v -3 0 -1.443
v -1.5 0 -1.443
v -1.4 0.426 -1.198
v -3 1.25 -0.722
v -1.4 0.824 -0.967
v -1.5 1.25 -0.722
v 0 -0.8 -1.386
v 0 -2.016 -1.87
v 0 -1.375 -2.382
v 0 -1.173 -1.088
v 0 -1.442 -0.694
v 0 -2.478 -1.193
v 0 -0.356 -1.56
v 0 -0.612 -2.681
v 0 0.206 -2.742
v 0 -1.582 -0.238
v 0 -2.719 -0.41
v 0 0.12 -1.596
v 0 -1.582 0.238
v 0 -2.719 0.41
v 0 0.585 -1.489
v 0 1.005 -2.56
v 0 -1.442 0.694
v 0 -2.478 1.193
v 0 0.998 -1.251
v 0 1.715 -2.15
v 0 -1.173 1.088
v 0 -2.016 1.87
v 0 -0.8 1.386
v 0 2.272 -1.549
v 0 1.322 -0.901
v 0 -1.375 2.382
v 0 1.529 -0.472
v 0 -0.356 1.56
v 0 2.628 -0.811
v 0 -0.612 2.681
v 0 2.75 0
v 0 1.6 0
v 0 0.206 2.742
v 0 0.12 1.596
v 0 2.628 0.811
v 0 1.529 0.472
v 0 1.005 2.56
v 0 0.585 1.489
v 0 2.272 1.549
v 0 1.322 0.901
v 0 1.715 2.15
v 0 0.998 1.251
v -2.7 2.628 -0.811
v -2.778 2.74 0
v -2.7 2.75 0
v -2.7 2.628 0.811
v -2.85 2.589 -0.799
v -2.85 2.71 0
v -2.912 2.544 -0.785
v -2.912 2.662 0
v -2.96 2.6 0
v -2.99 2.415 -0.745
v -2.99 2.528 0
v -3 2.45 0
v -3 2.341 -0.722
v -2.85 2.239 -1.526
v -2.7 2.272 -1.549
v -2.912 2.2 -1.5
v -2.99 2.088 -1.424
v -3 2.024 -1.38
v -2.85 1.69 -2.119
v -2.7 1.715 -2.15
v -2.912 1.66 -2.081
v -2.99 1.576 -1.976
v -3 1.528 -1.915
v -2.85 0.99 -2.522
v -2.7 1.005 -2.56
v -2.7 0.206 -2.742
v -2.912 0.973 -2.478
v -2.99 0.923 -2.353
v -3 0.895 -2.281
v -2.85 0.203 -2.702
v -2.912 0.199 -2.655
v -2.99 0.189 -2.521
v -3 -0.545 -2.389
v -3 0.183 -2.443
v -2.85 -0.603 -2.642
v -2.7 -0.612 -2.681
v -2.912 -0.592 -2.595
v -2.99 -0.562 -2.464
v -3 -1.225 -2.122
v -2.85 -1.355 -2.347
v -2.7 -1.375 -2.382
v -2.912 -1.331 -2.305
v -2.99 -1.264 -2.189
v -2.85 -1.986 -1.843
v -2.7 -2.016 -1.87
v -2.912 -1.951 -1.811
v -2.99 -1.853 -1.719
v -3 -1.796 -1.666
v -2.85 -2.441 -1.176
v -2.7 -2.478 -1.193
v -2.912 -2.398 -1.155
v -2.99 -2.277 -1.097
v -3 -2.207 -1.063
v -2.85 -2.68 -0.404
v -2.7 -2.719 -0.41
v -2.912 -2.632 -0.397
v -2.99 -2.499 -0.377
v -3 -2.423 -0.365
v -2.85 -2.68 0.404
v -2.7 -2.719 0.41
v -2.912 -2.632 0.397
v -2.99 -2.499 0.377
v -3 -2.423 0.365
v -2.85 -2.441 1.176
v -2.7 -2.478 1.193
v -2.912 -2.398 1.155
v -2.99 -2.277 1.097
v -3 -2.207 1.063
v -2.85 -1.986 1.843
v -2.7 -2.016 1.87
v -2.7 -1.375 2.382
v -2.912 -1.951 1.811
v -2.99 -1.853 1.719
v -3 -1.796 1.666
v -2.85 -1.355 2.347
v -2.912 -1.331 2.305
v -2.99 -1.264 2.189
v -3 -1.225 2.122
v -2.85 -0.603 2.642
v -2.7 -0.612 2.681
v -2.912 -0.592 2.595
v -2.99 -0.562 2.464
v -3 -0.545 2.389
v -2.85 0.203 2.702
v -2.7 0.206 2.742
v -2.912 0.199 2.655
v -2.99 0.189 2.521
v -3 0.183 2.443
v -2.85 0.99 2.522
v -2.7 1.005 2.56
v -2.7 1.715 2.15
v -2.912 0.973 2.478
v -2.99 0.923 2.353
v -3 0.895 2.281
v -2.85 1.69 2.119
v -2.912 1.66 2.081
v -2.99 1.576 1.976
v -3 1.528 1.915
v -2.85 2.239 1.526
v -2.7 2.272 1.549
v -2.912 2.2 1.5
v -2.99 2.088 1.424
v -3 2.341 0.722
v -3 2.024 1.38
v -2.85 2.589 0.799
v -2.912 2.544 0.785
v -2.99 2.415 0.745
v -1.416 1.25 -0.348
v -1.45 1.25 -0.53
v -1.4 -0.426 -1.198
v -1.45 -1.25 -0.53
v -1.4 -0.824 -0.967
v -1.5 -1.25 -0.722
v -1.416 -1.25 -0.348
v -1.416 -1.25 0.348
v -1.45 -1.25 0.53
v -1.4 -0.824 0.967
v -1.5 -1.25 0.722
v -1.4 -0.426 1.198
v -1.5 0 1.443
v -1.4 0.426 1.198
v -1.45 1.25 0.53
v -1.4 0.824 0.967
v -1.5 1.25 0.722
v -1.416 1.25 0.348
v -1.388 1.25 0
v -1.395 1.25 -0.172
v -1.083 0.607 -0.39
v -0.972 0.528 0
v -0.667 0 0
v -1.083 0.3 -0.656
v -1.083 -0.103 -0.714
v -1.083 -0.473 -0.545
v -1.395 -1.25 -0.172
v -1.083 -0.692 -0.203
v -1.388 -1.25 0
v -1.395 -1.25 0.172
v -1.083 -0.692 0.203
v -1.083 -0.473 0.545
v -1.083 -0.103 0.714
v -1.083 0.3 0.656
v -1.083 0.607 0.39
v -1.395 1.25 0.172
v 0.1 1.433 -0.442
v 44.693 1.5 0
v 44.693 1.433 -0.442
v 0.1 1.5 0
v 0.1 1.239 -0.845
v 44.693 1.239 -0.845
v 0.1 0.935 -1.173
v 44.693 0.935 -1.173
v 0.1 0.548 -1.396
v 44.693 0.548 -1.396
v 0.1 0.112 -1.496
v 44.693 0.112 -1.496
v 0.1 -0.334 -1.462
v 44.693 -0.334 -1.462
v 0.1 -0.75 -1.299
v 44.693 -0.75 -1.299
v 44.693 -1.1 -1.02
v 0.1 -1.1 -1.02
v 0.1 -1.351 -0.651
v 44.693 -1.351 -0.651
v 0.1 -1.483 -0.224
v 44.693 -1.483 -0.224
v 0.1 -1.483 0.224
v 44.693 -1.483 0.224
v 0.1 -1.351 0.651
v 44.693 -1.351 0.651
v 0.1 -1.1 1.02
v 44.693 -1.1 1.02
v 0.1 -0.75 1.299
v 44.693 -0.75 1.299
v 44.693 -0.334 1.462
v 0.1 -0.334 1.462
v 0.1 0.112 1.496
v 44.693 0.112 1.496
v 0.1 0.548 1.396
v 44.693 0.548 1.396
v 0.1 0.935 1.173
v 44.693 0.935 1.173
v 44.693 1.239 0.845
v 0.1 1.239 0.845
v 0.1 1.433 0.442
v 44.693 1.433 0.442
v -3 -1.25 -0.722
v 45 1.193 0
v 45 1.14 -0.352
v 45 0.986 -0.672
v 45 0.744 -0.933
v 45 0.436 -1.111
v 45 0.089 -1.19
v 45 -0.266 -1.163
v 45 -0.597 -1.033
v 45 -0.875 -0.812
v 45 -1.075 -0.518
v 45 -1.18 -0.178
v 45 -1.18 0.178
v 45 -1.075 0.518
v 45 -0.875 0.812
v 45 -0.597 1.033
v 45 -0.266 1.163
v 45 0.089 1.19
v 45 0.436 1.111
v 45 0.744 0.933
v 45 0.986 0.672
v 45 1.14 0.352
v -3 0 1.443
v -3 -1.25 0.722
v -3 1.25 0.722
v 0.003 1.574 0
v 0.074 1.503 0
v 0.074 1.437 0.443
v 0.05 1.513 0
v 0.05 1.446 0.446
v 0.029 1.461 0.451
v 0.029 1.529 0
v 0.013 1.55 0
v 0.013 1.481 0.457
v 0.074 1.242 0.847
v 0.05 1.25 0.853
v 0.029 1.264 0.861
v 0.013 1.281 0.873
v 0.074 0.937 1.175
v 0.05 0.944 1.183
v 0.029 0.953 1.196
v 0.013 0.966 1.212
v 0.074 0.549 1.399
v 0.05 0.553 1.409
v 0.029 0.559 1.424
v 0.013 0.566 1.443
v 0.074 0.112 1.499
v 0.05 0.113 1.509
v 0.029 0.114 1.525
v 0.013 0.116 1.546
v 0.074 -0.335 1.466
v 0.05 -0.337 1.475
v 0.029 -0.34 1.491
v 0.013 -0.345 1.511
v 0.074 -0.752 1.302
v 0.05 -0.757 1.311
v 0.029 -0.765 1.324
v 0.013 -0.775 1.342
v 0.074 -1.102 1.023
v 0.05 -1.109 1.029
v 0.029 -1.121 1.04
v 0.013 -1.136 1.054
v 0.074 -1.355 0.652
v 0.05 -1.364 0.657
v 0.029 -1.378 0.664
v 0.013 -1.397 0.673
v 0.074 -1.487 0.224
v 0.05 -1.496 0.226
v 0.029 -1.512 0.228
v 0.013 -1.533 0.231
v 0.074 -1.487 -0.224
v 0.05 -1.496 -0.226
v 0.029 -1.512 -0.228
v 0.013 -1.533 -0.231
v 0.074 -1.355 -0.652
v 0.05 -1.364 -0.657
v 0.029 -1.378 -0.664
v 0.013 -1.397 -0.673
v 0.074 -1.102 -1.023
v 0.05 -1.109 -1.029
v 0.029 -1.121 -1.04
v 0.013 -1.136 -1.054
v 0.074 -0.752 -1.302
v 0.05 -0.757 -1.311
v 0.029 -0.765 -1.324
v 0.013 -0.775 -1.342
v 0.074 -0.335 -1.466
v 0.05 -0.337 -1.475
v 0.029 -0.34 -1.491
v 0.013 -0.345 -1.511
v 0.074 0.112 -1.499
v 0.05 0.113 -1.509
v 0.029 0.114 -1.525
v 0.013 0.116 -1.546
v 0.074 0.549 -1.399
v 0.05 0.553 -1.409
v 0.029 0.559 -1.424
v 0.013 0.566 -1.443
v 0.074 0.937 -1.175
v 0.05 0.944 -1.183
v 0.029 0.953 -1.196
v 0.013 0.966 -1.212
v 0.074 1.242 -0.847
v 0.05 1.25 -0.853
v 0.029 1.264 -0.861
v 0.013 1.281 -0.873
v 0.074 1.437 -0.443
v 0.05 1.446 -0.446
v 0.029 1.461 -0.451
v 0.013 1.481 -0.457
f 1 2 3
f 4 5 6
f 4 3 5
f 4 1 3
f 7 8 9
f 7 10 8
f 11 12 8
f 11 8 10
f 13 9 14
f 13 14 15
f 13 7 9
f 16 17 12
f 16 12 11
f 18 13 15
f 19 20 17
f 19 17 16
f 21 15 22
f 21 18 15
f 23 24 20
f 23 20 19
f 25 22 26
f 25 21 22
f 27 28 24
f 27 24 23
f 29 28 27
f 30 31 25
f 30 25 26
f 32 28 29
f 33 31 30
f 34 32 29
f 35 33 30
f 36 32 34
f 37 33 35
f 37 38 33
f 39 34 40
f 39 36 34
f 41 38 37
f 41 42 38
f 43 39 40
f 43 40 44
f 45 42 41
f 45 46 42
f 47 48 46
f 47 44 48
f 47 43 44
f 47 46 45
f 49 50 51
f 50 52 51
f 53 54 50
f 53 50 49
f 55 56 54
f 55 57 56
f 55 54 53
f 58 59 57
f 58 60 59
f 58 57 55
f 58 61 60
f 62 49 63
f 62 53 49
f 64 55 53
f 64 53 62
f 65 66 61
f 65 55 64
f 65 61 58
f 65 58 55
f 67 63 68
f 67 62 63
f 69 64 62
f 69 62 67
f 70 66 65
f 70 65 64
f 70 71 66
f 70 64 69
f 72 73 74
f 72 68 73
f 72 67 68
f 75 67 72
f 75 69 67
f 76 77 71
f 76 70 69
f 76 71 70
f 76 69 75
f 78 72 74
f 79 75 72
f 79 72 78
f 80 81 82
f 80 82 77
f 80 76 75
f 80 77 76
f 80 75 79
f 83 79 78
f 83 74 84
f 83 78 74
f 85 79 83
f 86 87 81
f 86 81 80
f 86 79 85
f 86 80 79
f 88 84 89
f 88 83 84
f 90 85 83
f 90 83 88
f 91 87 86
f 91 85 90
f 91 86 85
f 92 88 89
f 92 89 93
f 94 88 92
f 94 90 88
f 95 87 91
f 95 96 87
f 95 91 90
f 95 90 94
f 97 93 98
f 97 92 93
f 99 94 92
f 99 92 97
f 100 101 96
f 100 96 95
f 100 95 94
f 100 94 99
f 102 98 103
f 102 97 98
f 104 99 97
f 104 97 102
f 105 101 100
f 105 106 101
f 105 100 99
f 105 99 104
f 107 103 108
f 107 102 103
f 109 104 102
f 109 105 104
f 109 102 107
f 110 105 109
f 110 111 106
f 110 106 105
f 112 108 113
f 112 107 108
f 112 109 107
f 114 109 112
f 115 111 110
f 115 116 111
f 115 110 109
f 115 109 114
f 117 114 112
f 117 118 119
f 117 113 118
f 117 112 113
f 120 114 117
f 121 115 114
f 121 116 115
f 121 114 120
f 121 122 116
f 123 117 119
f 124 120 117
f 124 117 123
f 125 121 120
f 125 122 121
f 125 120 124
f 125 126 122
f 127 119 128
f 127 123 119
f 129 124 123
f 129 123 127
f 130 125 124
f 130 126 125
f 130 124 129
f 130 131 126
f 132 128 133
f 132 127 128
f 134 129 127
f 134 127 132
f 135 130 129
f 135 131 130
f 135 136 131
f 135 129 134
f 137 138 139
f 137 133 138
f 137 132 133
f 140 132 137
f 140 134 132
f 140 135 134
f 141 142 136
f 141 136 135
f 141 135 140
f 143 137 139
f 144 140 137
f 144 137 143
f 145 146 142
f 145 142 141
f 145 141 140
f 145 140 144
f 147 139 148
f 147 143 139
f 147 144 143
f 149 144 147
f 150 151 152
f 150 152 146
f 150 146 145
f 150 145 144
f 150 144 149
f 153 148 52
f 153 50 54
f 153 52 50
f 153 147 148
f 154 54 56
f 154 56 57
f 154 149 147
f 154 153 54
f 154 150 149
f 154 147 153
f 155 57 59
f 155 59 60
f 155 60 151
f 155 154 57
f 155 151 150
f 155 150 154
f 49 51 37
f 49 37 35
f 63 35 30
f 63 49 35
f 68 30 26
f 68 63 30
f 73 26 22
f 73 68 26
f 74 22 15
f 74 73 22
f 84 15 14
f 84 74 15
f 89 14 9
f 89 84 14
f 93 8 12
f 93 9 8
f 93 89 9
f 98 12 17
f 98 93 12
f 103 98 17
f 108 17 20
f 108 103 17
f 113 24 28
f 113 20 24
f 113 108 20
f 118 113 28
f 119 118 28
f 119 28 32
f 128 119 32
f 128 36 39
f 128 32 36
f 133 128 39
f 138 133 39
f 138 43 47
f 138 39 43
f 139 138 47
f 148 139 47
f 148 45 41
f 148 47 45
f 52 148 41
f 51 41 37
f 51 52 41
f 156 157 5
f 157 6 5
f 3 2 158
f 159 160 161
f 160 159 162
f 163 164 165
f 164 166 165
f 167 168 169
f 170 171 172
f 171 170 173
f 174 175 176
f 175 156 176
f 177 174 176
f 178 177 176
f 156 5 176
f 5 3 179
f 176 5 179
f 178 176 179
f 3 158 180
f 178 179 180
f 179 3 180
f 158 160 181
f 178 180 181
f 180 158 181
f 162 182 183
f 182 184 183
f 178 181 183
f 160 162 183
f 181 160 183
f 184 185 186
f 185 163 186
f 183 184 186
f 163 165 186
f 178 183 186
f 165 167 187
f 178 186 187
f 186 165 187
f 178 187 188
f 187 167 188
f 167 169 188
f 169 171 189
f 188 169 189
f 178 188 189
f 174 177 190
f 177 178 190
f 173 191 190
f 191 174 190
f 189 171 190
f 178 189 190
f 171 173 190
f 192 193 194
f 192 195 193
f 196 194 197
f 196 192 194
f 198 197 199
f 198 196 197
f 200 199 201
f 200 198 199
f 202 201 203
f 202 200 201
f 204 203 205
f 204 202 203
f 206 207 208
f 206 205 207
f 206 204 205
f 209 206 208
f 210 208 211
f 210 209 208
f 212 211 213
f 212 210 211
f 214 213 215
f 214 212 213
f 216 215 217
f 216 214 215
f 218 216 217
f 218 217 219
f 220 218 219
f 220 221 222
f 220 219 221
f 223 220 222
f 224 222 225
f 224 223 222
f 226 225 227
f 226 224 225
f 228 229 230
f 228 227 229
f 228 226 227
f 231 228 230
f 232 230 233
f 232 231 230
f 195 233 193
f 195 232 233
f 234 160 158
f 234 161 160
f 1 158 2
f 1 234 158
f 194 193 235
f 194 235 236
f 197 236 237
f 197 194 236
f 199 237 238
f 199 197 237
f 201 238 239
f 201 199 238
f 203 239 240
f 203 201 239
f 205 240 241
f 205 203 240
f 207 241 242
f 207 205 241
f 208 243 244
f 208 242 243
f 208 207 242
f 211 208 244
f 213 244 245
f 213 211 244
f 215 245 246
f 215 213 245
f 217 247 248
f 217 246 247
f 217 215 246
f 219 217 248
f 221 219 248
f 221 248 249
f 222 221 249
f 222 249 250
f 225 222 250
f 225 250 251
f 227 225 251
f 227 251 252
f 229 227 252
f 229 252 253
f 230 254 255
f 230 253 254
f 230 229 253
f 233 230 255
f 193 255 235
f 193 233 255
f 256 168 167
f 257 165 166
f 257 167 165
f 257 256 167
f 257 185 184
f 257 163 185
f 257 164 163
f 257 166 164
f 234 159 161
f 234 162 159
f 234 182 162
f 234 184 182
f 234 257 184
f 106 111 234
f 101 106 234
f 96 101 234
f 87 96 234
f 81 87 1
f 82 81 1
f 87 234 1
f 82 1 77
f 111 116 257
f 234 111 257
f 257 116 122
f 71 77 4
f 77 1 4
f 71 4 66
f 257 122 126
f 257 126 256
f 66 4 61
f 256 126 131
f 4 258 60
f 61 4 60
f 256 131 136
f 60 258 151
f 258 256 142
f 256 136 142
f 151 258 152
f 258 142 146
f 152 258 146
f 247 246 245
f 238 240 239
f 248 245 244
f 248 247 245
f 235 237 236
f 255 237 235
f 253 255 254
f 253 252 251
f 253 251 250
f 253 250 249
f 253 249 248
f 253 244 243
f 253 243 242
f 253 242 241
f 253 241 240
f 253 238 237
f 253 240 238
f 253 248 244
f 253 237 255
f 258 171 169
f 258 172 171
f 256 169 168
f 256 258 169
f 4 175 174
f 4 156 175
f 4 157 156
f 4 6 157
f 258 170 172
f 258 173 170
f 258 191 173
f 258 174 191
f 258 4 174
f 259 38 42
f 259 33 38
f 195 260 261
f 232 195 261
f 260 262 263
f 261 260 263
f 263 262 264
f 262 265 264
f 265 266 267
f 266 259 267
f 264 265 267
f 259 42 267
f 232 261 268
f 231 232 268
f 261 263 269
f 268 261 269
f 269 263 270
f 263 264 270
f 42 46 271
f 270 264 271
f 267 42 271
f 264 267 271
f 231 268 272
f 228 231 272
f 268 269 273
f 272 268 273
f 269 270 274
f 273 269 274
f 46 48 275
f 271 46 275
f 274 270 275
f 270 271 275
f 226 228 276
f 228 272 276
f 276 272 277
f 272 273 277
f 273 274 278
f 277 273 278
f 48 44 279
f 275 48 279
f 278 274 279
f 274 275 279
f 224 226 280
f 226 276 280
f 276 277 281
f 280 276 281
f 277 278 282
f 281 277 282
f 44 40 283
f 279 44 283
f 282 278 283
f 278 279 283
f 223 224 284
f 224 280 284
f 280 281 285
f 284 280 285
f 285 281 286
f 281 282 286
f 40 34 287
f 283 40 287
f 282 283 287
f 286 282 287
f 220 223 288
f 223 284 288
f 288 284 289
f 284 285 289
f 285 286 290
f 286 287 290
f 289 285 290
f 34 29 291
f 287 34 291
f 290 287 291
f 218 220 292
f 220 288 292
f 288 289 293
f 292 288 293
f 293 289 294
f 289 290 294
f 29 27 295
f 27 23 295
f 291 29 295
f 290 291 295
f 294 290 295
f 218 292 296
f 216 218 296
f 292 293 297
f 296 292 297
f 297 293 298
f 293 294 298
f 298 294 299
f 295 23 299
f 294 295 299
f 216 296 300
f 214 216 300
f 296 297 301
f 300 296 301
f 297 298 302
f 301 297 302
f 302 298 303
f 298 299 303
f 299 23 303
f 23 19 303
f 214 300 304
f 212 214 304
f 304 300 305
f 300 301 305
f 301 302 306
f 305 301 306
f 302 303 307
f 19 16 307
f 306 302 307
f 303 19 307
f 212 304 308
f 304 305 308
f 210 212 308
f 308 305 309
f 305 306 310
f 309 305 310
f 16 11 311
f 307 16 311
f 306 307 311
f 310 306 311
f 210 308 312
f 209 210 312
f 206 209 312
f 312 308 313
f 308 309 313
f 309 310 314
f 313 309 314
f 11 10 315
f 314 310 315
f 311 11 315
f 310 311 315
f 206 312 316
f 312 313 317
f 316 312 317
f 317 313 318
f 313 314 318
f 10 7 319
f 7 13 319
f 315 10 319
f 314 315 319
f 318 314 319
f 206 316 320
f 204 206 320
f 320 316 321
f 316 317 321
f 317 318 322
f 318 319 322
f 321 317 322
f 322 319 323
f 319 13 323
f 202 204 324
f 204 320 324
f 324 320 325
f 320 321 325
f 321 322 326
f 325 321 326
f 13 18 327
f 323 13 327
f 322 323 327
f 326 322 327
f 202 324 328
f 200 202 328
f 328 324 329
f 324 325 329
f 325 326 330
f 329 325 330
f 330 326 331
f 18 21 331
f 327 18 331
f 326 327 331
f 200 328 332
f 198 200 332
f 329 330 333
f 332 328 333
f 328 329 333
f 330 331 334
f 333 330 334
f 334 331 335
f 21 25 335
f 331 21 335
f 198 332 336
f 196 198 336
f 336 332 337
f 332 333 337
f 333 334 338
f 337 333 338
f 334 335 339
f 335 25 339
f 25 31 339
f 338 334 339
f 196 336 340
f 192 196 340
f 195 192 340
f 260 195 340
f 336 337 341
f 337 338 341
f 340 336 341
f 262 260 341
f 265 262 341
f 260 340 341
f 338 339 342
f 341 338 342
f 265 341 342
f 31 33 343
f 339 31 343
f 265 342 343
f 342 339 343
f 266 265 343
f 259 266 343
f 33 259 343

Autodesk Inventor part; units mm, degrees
ref_plane "YZ Plane" through (0, 0, 0) normal (1, 0, 0) x (0, 1, 0)
ref_plane "XZ Plane" through (0, 0, 0) normal (0, 1, 0) x (-1, 0, 0)
sketch "Sketch1" plane through (0, 0, 0) normal (0, 0, 1) x (1, 0, 0)
  line L0 (-0.6667, 0) -> (45, 0)
  line L1 (45, 0) -> (45, 1.5)
  line L2 (45, 1.5) -> (27, 1.5)
  line L3 (27, 1.5) -> (26.6932, 1.5)
  line L4 (26.6932, 1.5) -> (0, 1.5)
  line L5 (0, 1.5) -> (0, 2.75)
  line L6 (0, 2.75) -> (-3, 2.75)
  line L7 (-3, 2.75) -> (-3, 1.4434)
  line L8 (-3, 1.4434) -> (-1.5, 1.4434)
  line L9 (-1.5, 1.4434) -> (-0.6667, 0)
  line L10 (-10.6, 0) -> (42.6, 0) projected
  line L11 (0, -0.55) -> (0, 3.3) projected
  line L12 (27, 1.5) -> (0, 1.5) construction
  dimension "d1" = 18
  dimension "d2" = 0.3068
  dimension "d3" = 3
  dimension "d4" = 1.5
  dimension "d5" = 60
  dimension "d6" = 3
  dimension "d7" = 3
  dimension "d8" = 2.8868
  dimension "d9" = 5.5
  dimension "d26" = 45
revolve "Body" add sketch "Sketch1" angle 360 about axis through (-0.6667, 0, 0) along (1, 0, 0)
sketch "Sketch2" plane through (-3, 0, 0) normal (-1, 0, 0) x (0, 0, 1)
  circle A0 centre (0, 0) radius 1.4434 projected
  line L0 (0, -3.85) -> (0, 3.85) projected
  line L1 (-3.85, 0) -> (3.85, 0) projected
  line L2 (1.4434, 0) -> (0.7217, -1.25)
  line L3 (0.7217, -1.25) -> (-0.7217, -1.25)
  line L4 (-0.7217, -1.25) -> (-1.4434, 0)
  line L5 (-1.4434, 0) -> (-0.7217, 1.25)
  line L6 (-0.7217, 1.25) -> (0.7217, 1.25)
  line L7 (0.7217, 1.25) -> (1.4434, 0)
  point P0 (0, 0)
extrude "Slot" add sketch "Sketch2" against normal up to next contours L7 A0 | A0 L2 | L6 L0 A0 | A0 L0 L3 | L0 L6 A0 | A0 L3 L0 | L4 A0 | A0 L5
fillet "Fillet1" radius 0.3 1 edges at (-3, -2.75, 0)
thread "Thread" size "M3x0.5" class "6g" standard "ISO Metric profile" length 18
chamfer "Chamfer1" distance 0.3067 distance2 0.3067 1 edges at (45, -1.5, 0) measured on face at (45, -0.8088, -0.4964)
ref_plane "Work Plane1" through (29, 0, 0) normal (0, -1, 0) x (1, 0, 0)
fillet "Fillet2" radius 0.1 1 edges at (0, -1.5, 0)
equation "\"d1\" = GEL"
equation "\"d3\" = KOH"
equation "\"d4\" = INTI"
equation "\"d6\" = GD"
equation "\"d7\" = BDM"
equation "\"d8\" = 1.1547 * SW"
equation "\"d9\" = KOD"
equation "\"d26\" = NLG"
equation "\"d30\" = R"
equation "\"d17\" = RR"
equation "\"d13\" = GEL"
equation "\"d15\" = -0.5 * SPD + 0.5 * GD"
equation "\"d16\" = GUL"
equation "\"GD\" = NND"
equation "\"NLG\" = 45"
equation "\"GEL\" = 18"
equation "\"KOD\" = 5.5"
equation "\"KOH\" = 3"
equation "\"INTI\" = 1.5"
equation "\"GAL\" = 0.61345 * PTC"
equation "\"GUL\" = 0.61345 * PTC"
equation "\"BDM\" = NND"
equation "\"SW\" = 2.5"
equation "\"RR\" = 0.3"
equation "\"SPD\" = 2.38655"
equation "\"R\" = 0.1"
equation "\"TOA\" = 30deg"
equation "\"THREADDIA\" = 3"
equation "\"PTC\" = 0.5"
equation "\"NND\" = 3"
equation "\"E0\" = 1.155 * SW"
equation "\"GD1\" = THREADDIA - 1.2269 * PTC"
properties part number "M3x45" material "Steel, Mild"
